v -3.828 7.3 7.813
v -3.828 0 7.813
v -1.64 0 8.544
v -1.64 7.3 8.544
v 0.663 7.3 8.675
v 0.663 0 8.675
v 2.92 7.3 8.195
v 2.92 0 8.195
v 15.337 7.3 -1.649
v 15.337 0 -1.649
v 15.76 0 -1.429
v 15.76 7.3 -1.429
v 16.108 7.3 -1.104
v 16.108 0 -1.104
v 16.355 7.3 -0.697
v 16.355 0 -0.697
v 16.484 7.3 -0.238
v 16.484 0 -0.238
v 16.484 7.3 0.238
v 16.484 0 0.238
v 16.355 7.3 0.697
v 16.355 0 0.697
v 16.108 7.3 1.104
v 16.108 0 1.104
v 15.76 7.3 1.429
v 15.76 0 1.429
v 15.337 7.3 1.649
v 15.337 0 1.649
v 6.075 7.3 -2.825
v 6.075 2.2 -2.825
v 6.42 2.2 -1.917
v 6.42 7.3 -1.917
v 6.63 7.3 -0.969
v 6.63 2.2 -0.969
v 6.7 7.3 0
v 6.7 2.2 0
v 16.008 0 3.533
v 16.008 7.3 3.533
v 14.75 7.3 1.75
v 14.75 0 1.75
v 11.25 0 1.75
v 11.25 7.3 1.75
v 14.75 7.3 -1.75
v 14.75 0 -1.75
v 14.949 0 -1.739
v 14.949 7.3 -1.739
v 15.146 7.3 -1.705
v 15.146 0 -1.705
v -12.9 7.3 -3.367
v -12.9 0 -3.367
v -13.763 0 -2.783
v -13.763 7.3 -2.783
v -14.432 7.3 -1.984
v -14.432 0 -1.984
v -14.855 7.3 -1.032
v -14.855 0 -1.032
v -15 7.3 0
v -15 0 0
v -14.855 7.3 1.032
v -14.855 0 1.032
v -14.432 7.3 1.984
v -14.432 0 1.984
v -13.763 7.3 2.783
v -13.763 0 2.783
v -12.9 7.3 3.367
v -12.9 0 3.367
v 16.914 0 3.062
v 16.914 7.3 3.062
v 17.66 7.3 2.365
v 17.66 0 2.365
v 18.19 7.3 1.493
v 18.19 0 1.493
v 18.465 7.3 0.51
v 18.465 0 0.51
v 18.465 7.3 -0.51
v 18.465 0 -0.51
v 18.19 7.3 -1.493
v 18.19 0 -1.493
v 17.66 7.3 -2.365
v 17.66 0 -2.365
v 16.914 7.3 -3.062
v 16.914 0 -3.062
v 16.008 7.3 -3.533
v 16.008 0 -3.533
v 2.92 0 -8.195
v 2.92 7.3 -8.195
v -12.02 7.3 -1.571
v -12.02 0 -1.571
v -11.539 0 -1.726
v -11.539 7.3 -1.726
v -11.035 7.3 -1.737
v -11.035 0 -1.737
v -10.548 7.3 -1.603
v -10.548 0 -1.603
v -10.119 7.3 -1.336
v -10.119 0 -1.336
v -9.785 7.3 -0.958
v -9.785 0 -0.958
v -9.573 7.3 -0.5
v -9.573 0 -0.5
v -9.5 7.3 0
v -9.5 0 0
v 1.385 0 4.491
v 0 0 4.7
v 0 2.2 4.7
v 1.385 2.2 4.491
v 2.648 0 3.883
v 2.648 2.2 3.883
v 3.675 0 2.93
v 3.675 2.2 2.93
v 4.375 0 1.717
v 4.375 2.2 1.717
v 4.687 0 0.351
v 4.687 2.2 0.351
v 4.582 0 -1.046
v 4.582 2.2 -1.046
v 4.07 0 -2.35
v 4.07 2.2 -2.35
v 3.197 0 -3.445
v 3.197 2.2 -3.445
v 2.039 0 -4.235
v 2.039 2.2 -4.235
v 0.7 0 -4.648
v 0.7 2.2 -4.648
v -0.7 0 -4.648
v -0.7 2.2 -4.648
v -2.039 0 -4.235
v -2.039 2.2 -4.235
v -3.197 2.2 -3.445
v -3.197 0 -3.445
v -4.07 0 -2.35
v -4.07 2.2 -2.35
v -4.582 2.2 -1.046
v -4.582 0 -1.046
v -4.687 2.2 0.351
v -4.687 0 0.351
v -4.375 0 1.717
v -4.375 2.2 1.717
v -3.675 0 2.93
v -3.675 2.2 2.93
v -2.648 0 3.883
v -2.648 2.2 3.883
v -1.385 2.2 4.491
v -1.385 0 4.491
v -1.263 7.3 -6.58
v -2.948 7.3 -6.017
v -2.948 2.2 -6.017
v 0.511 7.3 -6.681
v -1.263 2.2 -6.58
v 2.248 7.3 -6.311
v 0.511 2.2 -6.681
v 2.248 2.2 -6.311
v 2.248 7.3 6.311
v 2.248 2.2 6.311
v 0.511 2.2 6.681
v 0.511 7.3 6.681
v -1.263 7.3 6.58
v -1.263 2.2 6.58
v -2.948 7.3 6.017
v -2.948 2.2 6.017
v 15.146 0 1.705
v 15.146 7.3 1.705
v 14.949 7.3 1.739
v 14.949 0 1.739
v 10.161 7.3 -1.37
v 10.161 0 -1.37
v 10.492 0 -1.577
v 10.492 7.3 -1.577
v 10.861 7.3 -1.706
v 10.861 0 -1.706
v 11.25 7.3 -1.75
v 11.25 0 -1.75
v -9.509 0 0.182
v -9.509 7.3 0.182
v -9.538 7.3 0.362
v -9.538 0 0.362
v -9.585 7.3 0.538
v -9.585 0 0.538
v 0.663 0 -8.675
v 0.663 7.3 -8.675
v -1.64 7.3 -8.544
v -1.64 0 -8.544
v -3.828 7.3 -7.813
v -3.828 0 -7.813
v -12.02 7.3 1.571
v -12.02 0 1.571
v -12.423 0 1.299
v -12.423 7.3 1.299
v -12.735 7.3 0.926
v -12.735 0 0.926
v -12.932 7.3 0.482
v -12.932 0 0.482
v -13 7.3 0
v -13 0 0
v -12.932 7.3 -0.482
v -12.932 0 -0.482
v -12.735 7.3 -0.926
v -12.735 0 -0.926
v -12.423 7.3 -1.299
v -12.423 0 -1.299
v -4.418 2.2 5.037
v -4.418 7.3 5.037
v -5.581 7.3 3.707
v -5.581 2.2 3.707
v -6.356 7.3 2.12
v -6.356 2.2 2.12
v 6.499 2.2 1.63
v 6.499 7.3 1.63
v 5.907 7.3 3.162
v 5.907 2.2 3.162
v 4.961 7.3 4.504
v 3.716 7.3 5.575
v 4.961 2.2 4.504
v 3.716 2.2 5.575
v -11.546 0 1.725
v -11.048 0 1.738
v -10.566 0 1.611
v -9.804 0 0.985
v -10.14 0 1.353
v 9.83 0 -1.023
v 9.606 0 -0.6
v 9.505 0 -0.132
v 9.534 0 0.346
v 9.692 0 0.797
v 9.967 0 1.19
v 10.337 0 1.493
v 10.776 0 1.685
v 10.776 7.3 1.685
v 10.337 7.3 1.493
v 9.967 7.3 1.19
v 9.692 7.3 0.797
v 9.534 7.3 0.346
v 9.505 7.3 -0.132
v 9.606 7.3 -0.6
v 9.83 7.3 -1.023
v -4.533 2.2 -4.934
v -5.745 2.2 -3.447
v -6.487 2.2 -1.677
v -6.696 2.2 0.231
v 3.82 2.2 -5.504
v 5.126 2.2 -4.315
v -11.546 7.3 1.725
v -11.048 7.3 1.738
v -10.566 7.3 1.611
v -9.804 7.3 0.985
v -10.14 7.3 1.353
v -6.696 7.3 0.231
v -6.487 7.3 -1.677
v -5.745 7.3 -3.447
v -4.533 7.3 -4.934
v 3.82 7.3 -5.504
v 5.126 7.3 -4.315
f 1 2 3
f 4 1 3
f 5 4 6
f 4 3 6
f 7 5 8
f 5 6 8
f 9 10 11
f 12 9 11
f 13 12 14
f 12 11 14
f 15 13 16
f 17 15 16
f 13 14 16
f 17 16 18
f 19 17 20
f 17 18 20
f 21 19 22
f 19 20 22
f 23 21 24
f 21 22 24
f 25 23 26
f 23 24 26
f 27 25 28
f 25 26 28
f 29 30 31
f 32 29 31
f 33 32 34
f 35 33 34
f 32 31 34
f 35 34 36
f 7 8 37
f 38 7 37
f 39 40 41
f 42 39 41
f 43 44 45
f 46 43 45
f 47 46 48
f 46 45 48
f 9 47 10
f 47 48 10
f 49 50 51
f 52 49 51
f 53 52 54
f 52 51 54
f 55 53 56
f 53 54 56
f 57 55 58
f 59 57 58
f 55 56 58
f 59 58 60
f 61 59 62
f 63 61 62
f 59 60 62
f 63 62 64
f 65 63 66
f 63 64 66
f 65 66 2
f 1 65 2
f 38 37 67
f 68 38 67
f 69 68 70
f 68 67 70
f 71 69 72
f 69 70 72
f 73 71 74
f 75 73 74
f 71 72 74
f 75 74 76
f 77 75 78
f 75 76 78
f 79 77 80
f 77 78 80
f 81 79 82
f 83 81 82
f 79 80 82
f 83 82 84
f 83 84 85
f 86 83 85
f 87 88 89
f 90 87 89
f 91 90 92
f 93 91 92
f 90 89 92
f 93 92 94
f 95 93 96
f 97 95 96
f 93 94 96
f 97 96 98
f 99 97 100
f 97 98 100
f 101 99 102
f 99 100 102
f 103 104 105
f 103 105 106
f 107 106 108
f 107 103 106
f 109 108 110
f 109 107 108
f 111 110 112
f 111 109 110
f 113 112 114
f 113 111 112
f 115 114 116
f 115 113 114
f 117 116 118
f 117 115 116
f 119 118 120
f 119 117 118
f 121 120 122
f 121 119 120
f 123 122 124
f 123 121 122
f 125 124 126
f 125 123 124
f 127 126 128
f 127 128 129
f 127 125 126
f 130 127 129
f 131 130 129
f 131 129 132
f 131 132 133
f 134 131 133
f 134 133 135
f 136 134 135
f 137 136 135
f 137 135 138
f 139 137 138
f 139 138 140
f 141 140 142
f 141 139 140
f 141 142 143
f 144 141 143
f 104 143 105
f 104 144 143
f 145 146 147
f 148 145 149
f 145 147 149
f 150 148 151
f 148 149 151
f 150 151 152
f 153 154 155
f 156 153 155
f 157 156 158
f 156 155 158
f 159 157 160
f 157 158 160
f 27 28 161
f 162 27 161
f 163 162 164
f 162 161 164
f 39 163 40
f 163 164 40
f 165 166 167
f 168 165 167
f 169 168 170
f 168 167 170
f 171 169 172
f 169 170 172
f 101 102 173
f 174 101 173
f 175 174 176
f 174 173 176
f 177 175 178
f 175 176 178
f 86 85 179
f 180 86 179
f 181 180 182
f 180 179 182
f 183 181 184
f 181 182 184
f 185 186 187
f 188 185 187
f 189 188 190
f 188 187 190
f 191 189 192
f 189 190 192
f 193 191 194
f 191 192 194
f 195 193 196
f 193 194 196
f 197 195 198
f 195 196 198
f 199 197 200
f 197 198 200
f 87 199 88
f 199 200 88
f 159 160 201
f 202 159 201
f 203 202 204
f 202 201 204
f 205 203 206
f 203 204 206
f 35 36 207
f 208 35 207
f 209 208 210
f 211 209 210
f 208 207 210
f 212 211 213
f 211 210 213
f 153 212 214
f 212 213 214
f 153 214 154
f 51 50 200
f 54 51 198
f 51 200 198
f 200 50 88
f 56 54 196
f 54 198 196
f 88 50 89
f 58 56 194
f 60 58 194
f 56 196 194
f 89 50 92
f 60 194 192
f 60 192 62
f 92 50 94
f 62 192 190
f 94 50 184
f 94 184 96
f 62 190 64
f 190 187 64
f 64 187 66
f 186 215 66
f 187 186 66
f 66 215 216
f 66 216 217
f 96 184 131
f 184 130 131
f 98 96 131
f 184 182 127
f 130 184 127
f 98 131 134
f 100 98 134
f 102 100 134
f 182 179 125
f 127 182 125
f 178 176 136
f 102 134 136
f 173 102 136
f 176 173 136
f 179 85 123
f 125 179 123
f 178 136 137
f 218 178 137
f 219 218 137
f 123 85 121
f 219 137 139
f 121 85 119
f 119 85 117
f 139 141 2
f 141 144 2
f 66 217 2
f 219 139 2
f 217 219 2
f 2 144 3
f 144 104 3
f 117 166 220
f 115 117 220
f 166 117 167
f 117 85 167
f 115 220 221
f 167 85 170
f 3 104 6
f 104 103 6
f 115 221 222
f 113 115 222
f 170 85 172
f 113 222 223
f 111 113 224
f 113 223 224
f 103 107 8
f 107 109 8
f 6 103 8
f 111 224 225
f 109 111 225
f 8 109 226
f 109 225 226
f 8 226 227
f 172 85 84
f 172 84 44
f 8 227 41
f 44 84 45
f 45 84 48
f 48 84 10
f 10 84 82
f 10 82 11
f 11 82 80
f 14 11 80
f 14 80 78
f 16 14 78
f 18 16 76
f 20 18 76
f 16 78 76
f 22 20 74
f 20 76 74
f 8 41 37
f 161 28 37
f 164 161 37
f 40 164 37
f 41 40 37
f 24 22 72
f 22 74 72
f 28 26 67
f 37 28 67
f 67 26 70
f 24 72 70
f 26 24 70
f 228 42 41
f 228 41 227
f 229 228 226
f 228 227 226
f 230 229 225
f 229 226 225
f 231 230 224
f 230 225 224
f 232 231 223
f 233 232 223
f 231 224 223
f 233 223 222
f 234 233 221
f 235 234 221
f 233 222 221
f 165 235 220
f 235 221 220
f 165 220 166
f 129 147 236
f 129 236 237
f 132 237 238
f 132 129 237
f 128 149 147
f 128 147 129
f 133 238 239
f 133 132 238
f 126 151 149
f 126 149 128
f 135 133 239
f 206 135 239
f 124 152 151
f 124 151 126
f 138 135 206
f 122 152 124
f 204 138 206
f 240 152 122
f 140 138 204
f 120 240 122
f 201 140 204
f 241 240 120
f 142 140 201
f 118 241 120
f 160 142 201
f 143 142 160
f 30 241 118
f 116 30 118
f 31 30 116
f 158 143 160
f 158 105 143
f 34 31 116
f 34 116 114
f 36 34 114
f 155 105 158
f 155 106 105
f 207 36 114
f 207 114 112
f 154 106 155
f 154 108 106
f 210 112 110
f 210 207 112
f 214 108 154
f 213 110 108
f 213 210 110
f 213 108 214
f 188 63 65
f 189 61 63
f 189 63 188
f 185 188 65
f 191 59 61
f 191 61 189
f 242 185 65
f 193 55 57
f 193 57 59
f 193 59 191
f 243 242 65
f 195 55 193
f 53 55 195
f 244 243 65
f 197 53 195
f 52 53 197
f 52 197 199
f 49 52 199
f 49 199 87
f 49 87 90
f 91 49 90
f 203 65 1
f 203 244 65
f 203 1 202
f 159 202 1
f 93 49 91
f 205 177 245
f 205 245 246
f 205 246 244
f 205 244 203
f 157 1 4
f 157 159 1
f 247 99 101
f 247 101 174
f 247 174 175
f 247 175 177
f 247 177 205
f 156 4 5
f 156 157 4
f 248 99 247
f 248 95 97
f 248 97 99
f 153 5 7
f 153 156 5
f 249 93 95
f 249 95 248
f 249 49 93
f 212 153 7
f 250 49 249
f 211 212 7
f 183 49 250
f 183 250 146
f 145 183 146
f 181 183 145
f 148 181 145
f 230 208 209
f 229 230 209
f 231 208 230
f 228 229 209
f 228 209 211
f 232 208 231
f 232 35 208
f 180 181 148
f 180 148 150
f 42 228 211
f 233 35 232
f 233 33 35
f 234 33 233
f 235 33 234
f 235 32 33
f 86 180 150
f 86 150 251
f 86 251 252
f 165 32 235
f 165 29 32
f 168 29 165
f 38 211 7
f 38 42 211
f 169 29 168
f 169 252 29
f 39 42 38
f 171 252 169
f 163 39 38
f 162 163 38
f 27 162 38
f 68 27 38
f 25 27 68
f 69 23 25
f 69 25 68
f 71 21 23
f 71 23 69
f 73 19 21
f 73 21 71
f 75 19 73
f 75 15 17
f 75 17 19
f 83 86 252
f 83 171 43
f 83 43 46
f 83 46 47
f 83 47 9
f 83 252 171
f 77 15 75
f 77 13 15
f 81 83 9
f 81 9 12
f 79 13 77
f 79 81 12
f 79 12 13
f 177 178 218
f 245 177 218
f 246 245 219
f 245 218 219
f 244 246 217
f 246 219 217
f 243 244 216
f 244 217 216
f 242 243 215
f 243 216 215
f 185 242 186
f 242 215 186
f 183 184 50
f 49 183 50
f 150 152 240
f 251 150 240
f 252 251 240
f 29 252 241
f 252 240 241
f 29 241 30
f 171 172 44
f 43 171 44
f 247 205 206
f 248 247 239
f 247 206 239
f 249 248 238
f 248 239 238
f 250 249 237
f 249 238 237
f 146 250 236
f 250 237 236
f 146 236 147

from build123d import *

# Parameters (mm, degrees)
SKETCH1_R     = 6.7
SKETCH1_R_2   = 1.75
BODY_DEPTH    = 7.3
SKETCH1_4_R   = 6.7
SKETCH1_4_R_2 = 4.7
FLOOR_2_DEPTH = 2.2


with BuildPart() as part:
    # Sketch1 → Body (new body)
    with BuildSketch(Plane(origin=(0, 0, 0), x_dir=(1, 0, 0), z_dir=(0, 1, 0))):
        with BuildLine():
            ThreePointArc((16.008474576, -3.532526255), (18.5, 0), (16.008474576, 3.532526255))
            Line((16.008474576, 3.532526255), (2.919661017, 8.195460911))
            ThreePointArc((2.919661017, 8.195460911), (-0.492868396, 8.686027904), (-3.828, 7.812580624))
            Line((-3.828, 7.812580624), (-12.9, 3.367491648))
            ThreePointArc((-12.9, 3.367491648), (-15, 0), (-12.9, -3.367491648))
            Line((-12.9, -3.367491648), (-3.828, -7.812580624))
            ThreePointArc((-3.828, -7.812580624), (-0.492868396, -8.686027904), (2.919661017, -8.195460911))
            Line((2.919661017, -8.195460911), (16.008474576, -3.532526255))
        make_face()
        with BuildLine():
            Line((11.25, 1.75), (14.75, 1.75))
            ThreePointArc((14.75, 1.75), (16.5, 0), (14.75, -1.75))
            Line((14.75, -1.75), (11.25, -1.75))
            ThreePointArc((11.25, -1.75), (9.5, 0), (11.25, 1.75))
        make_face(mode=Mode.SUBTRACT)
        Circle(SKETCH1_R, mode=Mode.SUBTRACT)
        with Locations((-11.25, 0)):
            Circle(SKETCH1_R_2, mode=Mode.SUBTRACT)
    extrude(amount=BODY_DEPTH)

    # Sketch1<4> → Floor 2 (add)
    with BuildSketch(Plane(origin=(0, 0, 0), x_dir=(1, 0, 0), z_dir=(0, 1, 0))):
        Circle(SKETCH1_4_R)
        Circle(SKETCH1_4_R_2, mode=Mode.SUBTRACT)
    extrude(amount=FLOOR_2_DEPTH)


solid = part.part
